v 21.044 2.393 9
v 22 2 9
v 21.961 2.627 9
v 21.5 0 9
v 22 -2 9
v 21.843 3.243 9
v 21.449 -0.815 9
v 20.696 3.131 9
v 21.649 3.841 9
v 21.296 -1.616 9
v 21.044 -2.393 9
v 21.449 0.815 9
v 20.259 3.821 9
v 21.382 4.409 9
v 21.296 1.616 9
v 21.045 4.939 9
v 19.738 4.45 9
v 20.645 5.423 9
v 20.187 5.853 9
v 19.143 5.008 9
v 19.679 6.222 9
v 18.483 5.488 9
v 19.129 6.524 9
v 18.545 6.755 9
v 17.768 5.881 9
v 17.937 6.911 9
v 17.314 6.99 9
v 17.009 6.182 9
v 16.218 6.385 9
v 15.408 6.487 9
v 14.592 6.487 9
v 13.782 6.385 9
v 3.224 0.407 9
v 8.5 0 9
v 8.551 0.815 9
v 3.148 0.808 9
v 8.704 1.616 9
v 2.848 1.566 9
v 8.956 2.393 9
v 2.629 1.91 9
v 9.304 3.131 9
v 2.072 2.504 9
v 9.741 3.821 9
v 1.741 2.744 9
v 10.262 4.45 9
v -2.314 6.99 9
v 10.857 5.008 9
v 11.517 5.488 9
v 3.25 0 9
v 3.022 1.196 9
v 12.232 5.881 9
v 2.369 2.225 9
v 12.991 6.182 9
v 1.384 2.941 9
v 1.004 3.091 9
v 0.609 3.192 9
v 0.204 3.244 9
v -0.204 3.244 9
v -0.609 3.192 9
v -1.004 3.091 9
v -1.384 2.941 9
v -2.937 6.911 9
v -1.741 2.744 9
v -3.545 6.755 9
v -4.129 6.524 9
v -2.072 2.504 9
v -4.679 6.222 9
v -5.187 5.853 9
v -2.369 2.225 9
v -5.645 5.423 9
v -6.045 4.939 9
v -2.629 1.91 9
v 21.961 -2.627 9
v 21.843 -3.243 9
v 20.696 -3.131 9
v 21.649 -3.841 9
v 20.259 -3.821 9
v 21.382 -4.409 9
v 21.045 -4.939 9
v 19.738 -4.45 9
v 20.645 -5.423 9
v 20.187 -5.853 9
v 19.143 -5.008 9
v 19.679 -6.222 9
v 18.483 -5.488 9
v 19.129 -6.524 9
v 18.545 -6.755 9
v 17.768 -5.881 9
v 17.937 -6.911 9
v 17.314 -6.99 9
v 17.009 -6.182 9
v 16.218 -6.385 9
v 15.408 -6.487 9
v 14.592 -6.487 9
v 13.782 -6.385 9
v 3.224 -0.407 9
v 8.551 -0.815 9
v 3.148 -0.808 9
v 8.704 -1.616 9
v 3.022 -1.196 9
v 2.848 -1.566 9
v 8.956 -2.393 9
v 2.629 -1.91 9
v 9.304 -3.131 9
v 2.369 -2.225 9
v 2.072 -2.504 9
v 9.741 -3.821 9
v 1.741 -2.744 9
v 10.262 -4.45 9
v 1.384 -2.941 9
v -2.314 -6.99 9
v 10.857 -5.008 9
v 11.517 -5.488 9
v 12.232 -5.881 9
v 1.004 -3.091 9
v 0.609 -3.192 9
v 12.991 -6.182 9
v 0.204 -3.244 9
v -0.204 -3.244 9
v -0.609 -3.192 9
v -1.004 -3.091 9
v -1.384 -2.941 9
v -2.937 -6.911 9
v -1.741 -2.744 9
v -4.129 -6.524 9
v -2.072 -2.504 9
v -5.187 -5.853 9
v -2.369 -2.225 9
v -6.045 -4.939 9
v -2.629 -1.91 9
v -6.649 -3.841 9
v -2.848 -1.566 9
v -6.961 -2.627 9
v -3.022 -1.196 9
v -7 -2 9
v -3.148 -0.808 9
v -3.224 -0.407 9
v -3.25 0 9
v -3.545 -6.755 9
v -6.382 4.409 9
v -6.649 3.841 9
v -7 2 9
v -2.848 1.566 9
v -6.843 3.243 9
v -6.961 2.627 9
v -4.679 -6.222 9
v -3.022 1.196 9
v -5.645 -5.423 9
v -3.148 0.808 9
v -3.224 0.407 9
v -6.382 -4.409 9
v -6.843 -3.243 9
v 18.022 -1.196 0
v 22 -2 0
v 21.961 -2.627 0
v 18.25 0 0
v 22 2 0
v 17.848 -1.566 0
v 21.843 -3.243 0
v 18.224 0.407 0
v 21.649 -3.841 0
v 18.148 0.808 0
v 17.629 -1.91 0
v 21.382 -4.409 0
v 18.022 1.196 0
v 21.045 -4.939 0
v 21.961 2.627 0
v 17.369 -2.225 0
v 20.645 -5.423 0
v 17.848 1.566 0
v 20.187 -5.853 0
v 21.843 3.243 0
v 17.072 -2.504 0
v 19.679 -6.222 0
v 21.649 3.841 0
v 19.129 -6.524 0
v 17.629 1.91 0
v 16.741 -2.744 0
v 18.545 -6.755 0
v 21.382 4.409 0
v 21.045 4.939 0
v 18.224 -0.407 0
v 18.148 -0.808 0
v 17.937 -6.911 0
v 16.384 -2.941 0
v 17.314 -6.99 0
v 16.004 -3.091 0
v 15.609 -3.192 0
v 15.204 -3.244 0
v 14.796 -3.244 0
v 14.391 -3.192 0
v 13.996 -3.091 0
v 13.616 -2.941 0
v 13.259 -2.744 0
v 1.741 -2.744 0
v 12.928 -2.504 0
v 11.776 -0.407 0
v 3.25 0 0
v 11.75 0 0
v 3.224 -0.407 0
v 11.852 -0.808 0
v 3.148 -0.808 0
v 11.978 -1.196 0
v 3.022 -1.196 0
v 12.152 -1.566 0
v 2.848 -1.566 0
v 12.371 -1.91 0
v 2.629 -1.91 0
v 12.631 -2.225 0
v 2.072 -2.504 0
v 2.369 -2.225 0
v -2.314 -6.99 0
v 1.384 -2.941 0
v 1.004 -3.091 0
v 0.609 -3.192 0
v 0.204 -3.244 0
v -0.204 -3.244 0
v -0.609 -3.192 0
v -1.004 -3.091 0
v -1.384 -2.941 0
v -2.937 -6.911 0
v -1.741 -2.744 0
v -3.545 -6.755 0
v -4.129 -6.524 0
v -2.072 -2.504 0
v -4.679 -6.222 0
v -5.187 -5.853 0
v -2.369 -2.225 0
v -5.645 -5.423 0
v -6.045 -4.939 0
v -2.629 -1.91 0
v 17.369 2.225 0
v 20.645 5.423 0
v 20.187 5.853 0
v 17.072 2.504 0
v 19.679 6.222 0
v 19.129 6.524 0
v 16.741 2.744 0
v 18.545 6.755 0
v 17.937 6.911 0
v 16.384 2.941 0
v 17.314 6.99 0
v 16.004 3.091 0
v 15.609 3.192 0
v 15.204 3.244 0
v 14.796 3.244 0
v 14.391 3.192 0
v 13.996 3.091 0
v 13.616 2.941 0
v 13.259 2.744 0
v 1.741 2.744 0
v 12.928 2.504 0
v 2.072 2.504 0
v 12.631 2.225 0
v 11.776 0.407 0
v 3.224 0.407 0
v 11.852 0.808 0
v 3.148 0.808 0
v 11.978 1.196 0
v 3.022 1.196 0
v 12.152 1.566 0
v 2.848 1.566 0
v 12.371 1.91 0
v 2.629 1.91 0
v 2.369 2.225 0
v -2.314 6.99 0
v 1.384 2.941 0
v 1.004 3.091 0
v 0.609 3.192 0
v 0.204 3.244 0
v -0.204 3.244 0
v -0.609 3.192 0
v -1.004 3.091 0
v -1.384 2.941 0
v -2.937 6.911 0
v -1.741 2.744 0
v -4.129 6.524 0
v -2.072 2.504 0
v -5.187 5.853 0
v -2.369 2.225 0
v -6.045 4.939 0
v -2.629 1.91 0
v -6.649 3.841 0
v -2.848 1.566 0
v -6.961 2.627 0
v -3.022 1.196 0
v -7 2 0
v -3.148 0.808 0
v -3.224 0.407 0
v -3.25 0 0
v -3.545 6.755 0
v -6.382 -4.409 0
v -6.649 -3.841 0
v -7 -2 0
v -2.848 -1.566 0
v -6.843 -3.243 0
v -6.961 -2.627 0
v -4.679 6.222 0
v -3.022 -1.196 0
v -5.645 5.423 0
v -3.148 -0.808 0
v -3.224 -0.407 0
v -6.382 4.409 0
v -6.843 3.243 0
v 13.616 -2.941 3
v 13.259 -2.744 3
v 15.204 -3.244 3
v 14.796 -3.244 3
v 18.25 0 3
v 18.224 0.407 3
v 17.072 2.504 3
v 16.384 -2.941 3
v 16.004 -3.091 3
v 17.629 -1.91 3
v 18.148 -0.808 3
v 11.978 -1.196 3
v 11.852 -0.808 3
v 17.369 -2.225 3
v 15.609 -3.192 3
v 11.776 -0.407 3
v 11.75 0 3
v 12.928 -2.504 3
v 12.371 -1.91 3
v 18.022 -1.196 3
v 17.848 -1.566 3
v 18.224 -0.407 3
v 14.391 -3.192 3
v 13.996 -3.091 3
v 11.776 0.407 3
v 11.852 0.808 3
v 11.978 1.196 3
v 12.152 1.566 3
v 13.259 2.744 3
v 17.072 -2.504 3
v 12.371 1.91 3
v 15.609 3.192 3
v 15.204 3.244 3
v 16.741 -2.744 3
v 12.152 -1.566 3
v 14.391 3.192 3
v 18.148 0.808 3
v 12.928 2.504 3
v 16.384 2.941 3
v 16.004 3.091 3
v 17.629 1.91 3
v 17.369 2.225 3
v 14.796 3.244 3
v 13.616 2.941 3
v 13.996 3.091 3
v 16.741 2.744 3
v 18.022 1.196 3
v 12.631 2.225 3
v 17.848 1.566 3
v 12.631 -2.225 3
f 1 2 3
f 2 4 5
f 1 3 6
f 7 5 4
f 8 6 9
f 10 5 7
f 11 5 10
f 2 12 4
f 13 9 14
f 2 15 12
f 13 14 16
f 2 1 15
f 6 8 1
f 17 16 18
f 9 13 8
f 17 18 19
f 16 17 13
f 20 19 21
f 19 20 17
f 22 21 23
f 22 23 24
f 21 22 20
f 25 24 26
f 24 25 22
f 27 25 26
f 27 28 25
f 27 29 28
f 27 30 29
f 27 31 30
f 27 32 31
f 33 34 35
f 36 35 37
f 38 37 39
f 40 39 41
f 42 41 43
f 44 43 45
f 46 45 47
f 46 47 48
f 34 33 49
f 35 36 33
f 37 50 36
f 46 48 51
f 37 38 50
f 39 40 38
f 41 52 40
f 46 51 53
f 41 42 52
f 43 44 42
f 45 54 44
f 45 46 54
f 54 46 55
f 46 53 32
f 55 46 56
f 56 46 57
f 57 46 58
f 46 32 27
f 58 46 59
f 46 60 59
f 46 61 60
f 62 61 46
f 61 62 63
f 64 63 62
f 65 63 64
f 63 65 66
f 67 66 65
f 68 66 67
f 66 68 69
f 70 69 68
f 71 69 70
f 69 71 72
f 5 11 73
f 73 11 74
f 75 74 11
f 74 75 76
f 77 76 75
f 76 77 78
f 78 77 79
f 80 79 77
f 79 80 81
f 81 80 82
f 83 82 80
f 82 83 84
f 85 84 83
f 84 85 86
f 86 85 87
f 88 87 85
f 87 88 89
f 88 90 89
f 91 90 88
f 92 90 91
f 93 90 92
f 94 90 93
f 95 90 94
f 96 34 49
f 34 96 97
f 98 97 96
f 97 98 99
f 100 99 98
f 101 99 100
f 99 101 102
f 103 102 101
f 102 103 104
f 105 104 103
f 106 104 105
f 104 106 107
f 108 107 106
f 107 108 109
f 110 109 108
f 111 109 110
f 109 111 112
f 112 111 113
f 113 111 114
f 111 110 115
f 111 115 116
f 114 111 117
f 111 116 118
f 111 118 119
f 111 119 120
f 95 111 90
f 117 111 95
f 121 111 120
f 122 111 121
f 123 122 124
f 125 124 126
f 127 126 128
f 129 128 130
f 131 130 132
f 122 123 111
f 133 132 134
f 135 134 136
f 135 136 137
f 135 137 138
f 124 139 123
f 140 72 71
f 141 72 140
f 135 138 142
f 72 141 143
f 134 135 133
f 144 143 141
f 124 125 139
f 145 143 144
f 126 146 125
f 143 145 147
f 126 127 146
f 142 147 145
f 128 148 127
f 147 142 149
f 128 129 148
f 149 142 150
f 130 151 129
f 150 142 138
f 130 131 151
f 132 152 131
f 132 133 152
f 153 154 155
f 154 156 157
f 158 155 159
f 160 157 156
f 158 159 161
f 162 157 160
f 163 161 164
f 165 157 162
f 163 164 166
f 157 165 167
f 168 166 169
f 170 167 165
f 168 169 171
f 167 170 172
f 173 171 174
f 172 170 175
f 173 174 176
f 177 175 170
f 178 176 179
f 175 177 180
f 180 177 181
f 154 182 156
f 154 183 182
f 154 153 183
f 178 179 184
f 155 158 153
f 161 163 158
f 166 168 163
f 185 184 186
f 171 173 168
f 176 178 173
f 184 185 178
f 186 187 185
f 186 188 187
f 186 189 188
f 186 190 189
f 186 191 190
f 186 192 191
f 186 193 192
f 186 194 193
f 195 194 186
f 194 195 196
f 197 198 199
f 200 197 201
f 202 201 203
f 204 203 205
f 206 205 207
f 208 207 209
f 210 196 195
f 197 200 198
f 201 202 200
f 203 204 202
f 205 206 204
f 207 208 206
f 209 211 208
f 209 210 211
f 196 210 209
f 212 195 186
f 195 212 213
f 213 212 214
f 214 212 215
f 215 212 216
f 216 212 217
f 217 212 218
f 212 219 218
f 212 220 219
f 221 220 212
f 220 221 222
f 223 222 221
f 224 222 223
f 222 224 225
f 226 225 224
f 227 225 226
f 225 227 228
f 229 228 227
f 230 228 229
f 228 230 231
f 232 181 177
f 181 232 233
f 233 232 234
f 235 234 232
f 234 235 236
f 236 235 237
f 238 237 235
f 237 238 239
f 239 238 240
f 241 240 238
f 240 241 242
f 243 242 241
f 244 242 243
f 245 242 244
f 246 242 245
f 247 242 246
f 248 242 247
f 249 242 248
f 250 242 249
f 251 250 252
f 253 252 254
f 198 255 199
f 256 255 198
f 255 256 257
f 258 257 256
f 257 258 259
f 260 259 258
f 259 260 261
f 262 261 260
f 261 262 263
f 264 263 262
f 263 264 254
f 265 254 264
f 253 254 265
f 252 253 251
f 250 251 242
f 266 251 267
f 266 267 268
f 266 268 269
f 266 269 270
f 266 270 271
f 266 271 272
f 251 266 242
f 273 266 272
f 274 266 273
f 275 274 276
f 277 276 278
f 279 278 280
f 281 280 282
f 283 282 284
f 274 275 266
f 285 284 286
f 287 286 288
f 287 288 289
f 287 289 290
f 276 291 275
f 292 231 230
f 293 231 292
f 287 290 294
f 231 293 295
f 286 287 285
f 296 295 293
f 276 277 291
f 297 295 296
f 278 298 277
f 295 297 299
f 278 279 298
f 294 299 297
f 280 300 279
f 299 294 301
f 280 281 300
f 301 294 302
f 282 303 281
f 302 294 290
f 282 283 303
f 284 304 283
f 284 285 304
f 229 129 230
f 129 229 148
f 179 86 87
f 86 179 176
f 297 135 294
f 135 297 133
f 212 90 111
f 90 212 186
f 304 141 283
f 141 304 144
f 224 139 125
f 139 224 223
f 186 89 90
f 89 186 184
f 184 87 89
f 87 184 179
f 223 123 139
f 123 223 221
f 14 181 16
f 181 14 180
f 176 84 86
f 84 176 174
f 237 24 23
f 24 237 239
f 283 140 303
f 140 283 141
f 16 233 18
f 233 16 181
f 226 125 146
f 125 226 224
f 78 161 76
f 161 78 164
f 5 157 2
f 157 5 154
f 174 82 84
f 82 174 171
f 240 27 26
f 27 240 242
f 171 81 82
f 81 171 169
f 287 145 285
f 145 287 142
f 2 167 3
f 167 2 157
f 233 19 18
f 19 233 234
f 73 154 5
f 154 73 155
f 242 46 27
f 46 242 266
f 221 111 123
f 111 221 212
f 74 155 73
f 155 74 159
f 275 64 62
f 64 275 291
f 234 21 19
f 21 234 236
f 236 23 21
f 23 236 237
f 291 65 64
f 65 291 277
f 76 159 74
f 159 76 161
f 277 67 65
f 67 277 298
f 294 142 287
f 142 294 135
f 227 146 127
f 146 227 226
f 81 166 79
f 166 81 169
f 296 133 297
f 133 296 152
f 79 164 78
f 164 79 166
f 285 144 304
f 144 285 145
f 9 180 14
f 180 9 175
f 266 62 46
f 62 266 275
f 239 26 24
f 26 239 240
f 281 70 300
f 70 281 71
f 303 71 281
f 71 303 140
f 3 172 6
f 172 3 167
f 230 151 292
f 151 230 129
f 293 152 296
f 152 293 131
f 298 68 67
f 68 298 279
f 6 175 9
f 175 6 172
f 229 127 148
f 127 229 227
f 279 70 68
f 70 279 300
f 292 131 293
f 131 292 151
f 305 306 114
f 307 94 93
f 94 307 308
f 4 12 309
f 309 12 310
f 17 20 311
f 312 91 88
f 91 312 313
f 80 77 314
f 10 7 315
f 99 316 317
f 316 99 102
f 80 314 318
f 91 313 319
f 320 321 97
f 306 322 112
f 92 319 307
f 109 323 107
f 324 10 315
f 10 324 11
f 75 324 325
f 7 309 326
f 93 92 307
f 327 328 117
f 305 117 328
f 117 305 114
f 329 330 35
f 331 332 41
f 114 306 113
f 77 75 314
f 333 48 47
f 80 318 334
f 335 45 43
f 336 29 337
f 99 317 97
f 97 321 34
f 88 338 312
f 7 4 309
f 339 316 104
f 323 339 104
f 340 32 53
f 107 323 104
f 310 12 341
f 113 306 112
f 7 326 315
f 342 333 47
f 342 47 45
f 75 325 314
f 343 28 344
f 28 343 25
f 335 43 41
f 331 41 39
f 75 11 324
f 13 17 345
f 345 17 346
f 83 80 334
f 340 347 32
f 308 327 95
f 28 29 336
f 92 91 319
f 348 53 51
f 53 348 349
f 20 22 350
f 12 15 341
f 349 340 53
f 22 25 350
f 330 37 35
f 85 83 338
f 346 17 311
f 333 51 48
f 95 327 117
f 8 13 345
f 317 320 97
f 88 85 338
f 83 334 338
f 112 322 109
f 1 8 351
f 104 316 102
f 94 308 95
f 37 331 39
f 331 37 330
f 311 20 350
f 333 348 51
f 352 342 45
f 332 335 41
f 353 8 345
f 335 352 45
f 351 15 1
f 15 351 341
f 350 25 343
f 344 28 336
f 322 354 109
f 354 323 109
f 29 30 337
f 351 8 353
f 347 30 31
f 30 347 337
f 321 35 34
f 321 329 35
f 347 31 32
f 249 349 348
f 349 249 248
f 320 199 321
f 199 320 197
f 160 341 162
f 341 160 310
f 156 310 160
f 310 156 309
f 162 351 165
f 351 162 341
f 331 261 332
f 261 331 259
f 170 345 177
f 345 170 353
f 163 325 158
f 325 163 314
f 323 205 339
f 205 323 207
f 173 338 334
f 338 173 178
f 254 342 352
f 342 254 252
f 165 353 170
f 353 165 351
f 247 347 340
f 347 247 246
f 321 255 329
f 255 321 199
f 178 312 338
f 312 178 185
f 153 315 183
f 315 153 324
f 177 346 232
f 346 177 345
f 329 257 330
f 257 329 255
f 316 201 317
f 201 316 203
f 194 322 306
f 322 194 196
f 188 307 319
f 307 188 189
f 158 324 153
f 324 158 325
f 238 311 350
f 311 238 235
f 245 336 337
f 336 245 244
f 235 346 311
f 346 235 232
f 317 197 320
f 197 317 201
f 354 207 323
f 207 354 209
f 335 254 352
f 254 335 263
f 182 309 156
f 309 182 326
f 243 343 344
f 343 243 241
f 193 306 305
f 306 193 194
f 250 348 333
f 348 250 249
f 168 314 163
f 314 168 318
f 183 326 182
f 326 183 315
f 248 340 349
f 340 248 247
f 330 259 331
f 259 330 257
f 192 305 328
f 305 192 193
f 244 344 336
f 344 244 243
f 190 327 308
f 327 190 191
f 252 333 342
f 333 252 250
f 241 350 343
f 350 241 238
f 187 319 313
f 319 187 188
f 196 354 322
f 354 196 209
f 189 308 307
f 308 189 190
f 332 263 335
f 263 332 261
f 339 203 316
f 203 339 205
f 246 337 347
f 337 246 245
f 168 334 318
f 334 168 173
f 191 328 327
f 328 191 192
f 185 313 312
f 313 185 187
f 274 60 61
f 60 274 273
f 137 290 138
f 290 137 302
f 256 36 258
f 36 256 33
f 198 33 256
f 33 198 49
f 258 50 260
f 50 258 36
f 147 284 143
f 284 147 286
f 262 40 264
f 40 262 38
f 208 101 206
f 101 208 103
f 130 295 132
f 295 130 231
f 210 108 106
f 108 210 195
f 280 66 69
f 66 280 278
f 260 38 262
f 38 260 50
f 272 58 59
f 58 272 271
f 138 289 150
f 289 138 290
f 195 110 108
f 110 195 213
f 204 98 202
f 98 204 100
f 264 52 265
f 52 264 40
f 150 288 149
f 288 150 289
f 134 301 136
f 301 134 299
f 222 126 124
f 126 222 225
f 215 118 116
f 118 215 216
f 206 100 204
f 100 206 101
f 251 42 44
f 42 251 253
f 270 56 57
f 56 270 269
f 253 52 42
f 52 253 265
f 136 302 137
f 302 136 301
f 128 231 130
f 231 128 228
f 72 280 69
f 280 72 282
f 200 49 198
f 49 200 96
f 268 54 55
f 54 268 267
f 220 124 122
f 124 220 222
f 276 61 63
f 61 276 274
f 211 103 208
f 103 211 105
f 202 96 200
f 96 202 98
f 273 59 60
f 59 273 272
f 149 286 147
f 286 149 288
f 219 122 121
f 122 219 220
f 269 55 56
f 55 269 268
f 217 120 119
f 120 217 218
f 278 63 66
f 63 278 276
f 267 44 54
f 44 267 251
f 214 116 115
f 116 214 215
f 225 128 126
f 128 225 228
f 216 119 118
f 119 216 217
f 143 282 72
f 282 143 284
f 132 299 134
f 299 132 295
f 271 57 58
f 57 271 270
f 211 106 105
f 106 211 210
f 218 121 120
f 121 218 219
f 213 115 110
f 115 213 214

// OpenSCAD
$fn = 50;


difference() {
	union() {
		cylinder(h = 9, r = 7.0000000000);
		translate(v = [7.5000000000, 0.0000000000, 0]) {
			hull() {
				translate(v = [-9.5000000000, 2.0000000000, 0]) {
					cylinder(h = 9, r = 5);
				}
				translate(v = [9.5000000000, 2.0000000000, 0]) {
					cylinder(h = 9, r = 5);
				}
				translate(v = [-9.5000000000, -2.0000000000, 0]) {
					cylinder(h = 9, r = 5);
				}
				translate(v = [9.5000000000, -2.0000000000, 0]) {
					cylinder(h = 9, r = 5);
				}
			}
		}
		translate(v = [7.5000000000, 0.0000000000, 0]) {
			hull() {
				translate(v = [-9.5000000000, 2.0000000000, 0]) {
					cylinder(h = 9, r = 5);
				}
				translate(v = [9.5000000000, 2.0000000000, 0]) {
					cylinder(h = 9, r = 5);
				}
				translate(v = [-9.5000000000, -2.0000000000, 0]) {
					cylinder(h = 9, r = 5);
				}
				translate(v = [9.5000000000, -2.0000000000, 0]) {
					cylinder(h = 9, r = 5);
				}
			}
		}
	}
	union() {
		translate(v = [15.0000000000, 0.0000000000, 9]) {
			rotate(a = [0, 0, 0]) {
				difference() {
					union() {
						#translate(v = [0, 0, -9.0000000000]) {
							cylinder(h = 9, r = 2.2500000000);
						}
						#translate(v = [0, 0, -6]) {
							cylinder(h = 6, r1 = 3.2500000000, r2 = 6.5000000000);
						}
						#translate(v = [0, 0, -9.0000000000]) {
							cylinder(h = 9, r = 3.2500000000);
						}
						#translate(v = [0, 0, -9.0000000000]) {
							cylinder(h = 9, r = 2.2500000000);
						}
					}
					union();
				}
			}
		}
		translate(v = [15.0000000000, 0.0000000000, 9]) {
			rotate(a = [0, 0, 0]) {
				difference() {
					union() {
						#translate(v = [0, 0, -9.0000000000]) {
							cylinder(h = 9, r = 2.2500000000);
						}
						#translate(v = [0, 0, -6]) {
							cylinder(h = 6, r1 = 3.2500000000, r2 = 6.5000000000);
						}
						#translate(v = [0, 0, -9.0000000000]) {
							cylinder(h = 9, r = 3.2500000000);
						}
						#translate(v = [0, 0, -9.0000000000]) {
							cylinder(h = 9, r = 2.2500000000);
						}
					}
					union();
				}
			}
		}
		translate(v = [0, 0, -100]) {
			cylinder(h = 200, r = 3.2500000000);
		}
		translate(v = [0, 0, -100]) {
			cylinder(h = 200, r = 1.8000000000);
		}
	}
}
